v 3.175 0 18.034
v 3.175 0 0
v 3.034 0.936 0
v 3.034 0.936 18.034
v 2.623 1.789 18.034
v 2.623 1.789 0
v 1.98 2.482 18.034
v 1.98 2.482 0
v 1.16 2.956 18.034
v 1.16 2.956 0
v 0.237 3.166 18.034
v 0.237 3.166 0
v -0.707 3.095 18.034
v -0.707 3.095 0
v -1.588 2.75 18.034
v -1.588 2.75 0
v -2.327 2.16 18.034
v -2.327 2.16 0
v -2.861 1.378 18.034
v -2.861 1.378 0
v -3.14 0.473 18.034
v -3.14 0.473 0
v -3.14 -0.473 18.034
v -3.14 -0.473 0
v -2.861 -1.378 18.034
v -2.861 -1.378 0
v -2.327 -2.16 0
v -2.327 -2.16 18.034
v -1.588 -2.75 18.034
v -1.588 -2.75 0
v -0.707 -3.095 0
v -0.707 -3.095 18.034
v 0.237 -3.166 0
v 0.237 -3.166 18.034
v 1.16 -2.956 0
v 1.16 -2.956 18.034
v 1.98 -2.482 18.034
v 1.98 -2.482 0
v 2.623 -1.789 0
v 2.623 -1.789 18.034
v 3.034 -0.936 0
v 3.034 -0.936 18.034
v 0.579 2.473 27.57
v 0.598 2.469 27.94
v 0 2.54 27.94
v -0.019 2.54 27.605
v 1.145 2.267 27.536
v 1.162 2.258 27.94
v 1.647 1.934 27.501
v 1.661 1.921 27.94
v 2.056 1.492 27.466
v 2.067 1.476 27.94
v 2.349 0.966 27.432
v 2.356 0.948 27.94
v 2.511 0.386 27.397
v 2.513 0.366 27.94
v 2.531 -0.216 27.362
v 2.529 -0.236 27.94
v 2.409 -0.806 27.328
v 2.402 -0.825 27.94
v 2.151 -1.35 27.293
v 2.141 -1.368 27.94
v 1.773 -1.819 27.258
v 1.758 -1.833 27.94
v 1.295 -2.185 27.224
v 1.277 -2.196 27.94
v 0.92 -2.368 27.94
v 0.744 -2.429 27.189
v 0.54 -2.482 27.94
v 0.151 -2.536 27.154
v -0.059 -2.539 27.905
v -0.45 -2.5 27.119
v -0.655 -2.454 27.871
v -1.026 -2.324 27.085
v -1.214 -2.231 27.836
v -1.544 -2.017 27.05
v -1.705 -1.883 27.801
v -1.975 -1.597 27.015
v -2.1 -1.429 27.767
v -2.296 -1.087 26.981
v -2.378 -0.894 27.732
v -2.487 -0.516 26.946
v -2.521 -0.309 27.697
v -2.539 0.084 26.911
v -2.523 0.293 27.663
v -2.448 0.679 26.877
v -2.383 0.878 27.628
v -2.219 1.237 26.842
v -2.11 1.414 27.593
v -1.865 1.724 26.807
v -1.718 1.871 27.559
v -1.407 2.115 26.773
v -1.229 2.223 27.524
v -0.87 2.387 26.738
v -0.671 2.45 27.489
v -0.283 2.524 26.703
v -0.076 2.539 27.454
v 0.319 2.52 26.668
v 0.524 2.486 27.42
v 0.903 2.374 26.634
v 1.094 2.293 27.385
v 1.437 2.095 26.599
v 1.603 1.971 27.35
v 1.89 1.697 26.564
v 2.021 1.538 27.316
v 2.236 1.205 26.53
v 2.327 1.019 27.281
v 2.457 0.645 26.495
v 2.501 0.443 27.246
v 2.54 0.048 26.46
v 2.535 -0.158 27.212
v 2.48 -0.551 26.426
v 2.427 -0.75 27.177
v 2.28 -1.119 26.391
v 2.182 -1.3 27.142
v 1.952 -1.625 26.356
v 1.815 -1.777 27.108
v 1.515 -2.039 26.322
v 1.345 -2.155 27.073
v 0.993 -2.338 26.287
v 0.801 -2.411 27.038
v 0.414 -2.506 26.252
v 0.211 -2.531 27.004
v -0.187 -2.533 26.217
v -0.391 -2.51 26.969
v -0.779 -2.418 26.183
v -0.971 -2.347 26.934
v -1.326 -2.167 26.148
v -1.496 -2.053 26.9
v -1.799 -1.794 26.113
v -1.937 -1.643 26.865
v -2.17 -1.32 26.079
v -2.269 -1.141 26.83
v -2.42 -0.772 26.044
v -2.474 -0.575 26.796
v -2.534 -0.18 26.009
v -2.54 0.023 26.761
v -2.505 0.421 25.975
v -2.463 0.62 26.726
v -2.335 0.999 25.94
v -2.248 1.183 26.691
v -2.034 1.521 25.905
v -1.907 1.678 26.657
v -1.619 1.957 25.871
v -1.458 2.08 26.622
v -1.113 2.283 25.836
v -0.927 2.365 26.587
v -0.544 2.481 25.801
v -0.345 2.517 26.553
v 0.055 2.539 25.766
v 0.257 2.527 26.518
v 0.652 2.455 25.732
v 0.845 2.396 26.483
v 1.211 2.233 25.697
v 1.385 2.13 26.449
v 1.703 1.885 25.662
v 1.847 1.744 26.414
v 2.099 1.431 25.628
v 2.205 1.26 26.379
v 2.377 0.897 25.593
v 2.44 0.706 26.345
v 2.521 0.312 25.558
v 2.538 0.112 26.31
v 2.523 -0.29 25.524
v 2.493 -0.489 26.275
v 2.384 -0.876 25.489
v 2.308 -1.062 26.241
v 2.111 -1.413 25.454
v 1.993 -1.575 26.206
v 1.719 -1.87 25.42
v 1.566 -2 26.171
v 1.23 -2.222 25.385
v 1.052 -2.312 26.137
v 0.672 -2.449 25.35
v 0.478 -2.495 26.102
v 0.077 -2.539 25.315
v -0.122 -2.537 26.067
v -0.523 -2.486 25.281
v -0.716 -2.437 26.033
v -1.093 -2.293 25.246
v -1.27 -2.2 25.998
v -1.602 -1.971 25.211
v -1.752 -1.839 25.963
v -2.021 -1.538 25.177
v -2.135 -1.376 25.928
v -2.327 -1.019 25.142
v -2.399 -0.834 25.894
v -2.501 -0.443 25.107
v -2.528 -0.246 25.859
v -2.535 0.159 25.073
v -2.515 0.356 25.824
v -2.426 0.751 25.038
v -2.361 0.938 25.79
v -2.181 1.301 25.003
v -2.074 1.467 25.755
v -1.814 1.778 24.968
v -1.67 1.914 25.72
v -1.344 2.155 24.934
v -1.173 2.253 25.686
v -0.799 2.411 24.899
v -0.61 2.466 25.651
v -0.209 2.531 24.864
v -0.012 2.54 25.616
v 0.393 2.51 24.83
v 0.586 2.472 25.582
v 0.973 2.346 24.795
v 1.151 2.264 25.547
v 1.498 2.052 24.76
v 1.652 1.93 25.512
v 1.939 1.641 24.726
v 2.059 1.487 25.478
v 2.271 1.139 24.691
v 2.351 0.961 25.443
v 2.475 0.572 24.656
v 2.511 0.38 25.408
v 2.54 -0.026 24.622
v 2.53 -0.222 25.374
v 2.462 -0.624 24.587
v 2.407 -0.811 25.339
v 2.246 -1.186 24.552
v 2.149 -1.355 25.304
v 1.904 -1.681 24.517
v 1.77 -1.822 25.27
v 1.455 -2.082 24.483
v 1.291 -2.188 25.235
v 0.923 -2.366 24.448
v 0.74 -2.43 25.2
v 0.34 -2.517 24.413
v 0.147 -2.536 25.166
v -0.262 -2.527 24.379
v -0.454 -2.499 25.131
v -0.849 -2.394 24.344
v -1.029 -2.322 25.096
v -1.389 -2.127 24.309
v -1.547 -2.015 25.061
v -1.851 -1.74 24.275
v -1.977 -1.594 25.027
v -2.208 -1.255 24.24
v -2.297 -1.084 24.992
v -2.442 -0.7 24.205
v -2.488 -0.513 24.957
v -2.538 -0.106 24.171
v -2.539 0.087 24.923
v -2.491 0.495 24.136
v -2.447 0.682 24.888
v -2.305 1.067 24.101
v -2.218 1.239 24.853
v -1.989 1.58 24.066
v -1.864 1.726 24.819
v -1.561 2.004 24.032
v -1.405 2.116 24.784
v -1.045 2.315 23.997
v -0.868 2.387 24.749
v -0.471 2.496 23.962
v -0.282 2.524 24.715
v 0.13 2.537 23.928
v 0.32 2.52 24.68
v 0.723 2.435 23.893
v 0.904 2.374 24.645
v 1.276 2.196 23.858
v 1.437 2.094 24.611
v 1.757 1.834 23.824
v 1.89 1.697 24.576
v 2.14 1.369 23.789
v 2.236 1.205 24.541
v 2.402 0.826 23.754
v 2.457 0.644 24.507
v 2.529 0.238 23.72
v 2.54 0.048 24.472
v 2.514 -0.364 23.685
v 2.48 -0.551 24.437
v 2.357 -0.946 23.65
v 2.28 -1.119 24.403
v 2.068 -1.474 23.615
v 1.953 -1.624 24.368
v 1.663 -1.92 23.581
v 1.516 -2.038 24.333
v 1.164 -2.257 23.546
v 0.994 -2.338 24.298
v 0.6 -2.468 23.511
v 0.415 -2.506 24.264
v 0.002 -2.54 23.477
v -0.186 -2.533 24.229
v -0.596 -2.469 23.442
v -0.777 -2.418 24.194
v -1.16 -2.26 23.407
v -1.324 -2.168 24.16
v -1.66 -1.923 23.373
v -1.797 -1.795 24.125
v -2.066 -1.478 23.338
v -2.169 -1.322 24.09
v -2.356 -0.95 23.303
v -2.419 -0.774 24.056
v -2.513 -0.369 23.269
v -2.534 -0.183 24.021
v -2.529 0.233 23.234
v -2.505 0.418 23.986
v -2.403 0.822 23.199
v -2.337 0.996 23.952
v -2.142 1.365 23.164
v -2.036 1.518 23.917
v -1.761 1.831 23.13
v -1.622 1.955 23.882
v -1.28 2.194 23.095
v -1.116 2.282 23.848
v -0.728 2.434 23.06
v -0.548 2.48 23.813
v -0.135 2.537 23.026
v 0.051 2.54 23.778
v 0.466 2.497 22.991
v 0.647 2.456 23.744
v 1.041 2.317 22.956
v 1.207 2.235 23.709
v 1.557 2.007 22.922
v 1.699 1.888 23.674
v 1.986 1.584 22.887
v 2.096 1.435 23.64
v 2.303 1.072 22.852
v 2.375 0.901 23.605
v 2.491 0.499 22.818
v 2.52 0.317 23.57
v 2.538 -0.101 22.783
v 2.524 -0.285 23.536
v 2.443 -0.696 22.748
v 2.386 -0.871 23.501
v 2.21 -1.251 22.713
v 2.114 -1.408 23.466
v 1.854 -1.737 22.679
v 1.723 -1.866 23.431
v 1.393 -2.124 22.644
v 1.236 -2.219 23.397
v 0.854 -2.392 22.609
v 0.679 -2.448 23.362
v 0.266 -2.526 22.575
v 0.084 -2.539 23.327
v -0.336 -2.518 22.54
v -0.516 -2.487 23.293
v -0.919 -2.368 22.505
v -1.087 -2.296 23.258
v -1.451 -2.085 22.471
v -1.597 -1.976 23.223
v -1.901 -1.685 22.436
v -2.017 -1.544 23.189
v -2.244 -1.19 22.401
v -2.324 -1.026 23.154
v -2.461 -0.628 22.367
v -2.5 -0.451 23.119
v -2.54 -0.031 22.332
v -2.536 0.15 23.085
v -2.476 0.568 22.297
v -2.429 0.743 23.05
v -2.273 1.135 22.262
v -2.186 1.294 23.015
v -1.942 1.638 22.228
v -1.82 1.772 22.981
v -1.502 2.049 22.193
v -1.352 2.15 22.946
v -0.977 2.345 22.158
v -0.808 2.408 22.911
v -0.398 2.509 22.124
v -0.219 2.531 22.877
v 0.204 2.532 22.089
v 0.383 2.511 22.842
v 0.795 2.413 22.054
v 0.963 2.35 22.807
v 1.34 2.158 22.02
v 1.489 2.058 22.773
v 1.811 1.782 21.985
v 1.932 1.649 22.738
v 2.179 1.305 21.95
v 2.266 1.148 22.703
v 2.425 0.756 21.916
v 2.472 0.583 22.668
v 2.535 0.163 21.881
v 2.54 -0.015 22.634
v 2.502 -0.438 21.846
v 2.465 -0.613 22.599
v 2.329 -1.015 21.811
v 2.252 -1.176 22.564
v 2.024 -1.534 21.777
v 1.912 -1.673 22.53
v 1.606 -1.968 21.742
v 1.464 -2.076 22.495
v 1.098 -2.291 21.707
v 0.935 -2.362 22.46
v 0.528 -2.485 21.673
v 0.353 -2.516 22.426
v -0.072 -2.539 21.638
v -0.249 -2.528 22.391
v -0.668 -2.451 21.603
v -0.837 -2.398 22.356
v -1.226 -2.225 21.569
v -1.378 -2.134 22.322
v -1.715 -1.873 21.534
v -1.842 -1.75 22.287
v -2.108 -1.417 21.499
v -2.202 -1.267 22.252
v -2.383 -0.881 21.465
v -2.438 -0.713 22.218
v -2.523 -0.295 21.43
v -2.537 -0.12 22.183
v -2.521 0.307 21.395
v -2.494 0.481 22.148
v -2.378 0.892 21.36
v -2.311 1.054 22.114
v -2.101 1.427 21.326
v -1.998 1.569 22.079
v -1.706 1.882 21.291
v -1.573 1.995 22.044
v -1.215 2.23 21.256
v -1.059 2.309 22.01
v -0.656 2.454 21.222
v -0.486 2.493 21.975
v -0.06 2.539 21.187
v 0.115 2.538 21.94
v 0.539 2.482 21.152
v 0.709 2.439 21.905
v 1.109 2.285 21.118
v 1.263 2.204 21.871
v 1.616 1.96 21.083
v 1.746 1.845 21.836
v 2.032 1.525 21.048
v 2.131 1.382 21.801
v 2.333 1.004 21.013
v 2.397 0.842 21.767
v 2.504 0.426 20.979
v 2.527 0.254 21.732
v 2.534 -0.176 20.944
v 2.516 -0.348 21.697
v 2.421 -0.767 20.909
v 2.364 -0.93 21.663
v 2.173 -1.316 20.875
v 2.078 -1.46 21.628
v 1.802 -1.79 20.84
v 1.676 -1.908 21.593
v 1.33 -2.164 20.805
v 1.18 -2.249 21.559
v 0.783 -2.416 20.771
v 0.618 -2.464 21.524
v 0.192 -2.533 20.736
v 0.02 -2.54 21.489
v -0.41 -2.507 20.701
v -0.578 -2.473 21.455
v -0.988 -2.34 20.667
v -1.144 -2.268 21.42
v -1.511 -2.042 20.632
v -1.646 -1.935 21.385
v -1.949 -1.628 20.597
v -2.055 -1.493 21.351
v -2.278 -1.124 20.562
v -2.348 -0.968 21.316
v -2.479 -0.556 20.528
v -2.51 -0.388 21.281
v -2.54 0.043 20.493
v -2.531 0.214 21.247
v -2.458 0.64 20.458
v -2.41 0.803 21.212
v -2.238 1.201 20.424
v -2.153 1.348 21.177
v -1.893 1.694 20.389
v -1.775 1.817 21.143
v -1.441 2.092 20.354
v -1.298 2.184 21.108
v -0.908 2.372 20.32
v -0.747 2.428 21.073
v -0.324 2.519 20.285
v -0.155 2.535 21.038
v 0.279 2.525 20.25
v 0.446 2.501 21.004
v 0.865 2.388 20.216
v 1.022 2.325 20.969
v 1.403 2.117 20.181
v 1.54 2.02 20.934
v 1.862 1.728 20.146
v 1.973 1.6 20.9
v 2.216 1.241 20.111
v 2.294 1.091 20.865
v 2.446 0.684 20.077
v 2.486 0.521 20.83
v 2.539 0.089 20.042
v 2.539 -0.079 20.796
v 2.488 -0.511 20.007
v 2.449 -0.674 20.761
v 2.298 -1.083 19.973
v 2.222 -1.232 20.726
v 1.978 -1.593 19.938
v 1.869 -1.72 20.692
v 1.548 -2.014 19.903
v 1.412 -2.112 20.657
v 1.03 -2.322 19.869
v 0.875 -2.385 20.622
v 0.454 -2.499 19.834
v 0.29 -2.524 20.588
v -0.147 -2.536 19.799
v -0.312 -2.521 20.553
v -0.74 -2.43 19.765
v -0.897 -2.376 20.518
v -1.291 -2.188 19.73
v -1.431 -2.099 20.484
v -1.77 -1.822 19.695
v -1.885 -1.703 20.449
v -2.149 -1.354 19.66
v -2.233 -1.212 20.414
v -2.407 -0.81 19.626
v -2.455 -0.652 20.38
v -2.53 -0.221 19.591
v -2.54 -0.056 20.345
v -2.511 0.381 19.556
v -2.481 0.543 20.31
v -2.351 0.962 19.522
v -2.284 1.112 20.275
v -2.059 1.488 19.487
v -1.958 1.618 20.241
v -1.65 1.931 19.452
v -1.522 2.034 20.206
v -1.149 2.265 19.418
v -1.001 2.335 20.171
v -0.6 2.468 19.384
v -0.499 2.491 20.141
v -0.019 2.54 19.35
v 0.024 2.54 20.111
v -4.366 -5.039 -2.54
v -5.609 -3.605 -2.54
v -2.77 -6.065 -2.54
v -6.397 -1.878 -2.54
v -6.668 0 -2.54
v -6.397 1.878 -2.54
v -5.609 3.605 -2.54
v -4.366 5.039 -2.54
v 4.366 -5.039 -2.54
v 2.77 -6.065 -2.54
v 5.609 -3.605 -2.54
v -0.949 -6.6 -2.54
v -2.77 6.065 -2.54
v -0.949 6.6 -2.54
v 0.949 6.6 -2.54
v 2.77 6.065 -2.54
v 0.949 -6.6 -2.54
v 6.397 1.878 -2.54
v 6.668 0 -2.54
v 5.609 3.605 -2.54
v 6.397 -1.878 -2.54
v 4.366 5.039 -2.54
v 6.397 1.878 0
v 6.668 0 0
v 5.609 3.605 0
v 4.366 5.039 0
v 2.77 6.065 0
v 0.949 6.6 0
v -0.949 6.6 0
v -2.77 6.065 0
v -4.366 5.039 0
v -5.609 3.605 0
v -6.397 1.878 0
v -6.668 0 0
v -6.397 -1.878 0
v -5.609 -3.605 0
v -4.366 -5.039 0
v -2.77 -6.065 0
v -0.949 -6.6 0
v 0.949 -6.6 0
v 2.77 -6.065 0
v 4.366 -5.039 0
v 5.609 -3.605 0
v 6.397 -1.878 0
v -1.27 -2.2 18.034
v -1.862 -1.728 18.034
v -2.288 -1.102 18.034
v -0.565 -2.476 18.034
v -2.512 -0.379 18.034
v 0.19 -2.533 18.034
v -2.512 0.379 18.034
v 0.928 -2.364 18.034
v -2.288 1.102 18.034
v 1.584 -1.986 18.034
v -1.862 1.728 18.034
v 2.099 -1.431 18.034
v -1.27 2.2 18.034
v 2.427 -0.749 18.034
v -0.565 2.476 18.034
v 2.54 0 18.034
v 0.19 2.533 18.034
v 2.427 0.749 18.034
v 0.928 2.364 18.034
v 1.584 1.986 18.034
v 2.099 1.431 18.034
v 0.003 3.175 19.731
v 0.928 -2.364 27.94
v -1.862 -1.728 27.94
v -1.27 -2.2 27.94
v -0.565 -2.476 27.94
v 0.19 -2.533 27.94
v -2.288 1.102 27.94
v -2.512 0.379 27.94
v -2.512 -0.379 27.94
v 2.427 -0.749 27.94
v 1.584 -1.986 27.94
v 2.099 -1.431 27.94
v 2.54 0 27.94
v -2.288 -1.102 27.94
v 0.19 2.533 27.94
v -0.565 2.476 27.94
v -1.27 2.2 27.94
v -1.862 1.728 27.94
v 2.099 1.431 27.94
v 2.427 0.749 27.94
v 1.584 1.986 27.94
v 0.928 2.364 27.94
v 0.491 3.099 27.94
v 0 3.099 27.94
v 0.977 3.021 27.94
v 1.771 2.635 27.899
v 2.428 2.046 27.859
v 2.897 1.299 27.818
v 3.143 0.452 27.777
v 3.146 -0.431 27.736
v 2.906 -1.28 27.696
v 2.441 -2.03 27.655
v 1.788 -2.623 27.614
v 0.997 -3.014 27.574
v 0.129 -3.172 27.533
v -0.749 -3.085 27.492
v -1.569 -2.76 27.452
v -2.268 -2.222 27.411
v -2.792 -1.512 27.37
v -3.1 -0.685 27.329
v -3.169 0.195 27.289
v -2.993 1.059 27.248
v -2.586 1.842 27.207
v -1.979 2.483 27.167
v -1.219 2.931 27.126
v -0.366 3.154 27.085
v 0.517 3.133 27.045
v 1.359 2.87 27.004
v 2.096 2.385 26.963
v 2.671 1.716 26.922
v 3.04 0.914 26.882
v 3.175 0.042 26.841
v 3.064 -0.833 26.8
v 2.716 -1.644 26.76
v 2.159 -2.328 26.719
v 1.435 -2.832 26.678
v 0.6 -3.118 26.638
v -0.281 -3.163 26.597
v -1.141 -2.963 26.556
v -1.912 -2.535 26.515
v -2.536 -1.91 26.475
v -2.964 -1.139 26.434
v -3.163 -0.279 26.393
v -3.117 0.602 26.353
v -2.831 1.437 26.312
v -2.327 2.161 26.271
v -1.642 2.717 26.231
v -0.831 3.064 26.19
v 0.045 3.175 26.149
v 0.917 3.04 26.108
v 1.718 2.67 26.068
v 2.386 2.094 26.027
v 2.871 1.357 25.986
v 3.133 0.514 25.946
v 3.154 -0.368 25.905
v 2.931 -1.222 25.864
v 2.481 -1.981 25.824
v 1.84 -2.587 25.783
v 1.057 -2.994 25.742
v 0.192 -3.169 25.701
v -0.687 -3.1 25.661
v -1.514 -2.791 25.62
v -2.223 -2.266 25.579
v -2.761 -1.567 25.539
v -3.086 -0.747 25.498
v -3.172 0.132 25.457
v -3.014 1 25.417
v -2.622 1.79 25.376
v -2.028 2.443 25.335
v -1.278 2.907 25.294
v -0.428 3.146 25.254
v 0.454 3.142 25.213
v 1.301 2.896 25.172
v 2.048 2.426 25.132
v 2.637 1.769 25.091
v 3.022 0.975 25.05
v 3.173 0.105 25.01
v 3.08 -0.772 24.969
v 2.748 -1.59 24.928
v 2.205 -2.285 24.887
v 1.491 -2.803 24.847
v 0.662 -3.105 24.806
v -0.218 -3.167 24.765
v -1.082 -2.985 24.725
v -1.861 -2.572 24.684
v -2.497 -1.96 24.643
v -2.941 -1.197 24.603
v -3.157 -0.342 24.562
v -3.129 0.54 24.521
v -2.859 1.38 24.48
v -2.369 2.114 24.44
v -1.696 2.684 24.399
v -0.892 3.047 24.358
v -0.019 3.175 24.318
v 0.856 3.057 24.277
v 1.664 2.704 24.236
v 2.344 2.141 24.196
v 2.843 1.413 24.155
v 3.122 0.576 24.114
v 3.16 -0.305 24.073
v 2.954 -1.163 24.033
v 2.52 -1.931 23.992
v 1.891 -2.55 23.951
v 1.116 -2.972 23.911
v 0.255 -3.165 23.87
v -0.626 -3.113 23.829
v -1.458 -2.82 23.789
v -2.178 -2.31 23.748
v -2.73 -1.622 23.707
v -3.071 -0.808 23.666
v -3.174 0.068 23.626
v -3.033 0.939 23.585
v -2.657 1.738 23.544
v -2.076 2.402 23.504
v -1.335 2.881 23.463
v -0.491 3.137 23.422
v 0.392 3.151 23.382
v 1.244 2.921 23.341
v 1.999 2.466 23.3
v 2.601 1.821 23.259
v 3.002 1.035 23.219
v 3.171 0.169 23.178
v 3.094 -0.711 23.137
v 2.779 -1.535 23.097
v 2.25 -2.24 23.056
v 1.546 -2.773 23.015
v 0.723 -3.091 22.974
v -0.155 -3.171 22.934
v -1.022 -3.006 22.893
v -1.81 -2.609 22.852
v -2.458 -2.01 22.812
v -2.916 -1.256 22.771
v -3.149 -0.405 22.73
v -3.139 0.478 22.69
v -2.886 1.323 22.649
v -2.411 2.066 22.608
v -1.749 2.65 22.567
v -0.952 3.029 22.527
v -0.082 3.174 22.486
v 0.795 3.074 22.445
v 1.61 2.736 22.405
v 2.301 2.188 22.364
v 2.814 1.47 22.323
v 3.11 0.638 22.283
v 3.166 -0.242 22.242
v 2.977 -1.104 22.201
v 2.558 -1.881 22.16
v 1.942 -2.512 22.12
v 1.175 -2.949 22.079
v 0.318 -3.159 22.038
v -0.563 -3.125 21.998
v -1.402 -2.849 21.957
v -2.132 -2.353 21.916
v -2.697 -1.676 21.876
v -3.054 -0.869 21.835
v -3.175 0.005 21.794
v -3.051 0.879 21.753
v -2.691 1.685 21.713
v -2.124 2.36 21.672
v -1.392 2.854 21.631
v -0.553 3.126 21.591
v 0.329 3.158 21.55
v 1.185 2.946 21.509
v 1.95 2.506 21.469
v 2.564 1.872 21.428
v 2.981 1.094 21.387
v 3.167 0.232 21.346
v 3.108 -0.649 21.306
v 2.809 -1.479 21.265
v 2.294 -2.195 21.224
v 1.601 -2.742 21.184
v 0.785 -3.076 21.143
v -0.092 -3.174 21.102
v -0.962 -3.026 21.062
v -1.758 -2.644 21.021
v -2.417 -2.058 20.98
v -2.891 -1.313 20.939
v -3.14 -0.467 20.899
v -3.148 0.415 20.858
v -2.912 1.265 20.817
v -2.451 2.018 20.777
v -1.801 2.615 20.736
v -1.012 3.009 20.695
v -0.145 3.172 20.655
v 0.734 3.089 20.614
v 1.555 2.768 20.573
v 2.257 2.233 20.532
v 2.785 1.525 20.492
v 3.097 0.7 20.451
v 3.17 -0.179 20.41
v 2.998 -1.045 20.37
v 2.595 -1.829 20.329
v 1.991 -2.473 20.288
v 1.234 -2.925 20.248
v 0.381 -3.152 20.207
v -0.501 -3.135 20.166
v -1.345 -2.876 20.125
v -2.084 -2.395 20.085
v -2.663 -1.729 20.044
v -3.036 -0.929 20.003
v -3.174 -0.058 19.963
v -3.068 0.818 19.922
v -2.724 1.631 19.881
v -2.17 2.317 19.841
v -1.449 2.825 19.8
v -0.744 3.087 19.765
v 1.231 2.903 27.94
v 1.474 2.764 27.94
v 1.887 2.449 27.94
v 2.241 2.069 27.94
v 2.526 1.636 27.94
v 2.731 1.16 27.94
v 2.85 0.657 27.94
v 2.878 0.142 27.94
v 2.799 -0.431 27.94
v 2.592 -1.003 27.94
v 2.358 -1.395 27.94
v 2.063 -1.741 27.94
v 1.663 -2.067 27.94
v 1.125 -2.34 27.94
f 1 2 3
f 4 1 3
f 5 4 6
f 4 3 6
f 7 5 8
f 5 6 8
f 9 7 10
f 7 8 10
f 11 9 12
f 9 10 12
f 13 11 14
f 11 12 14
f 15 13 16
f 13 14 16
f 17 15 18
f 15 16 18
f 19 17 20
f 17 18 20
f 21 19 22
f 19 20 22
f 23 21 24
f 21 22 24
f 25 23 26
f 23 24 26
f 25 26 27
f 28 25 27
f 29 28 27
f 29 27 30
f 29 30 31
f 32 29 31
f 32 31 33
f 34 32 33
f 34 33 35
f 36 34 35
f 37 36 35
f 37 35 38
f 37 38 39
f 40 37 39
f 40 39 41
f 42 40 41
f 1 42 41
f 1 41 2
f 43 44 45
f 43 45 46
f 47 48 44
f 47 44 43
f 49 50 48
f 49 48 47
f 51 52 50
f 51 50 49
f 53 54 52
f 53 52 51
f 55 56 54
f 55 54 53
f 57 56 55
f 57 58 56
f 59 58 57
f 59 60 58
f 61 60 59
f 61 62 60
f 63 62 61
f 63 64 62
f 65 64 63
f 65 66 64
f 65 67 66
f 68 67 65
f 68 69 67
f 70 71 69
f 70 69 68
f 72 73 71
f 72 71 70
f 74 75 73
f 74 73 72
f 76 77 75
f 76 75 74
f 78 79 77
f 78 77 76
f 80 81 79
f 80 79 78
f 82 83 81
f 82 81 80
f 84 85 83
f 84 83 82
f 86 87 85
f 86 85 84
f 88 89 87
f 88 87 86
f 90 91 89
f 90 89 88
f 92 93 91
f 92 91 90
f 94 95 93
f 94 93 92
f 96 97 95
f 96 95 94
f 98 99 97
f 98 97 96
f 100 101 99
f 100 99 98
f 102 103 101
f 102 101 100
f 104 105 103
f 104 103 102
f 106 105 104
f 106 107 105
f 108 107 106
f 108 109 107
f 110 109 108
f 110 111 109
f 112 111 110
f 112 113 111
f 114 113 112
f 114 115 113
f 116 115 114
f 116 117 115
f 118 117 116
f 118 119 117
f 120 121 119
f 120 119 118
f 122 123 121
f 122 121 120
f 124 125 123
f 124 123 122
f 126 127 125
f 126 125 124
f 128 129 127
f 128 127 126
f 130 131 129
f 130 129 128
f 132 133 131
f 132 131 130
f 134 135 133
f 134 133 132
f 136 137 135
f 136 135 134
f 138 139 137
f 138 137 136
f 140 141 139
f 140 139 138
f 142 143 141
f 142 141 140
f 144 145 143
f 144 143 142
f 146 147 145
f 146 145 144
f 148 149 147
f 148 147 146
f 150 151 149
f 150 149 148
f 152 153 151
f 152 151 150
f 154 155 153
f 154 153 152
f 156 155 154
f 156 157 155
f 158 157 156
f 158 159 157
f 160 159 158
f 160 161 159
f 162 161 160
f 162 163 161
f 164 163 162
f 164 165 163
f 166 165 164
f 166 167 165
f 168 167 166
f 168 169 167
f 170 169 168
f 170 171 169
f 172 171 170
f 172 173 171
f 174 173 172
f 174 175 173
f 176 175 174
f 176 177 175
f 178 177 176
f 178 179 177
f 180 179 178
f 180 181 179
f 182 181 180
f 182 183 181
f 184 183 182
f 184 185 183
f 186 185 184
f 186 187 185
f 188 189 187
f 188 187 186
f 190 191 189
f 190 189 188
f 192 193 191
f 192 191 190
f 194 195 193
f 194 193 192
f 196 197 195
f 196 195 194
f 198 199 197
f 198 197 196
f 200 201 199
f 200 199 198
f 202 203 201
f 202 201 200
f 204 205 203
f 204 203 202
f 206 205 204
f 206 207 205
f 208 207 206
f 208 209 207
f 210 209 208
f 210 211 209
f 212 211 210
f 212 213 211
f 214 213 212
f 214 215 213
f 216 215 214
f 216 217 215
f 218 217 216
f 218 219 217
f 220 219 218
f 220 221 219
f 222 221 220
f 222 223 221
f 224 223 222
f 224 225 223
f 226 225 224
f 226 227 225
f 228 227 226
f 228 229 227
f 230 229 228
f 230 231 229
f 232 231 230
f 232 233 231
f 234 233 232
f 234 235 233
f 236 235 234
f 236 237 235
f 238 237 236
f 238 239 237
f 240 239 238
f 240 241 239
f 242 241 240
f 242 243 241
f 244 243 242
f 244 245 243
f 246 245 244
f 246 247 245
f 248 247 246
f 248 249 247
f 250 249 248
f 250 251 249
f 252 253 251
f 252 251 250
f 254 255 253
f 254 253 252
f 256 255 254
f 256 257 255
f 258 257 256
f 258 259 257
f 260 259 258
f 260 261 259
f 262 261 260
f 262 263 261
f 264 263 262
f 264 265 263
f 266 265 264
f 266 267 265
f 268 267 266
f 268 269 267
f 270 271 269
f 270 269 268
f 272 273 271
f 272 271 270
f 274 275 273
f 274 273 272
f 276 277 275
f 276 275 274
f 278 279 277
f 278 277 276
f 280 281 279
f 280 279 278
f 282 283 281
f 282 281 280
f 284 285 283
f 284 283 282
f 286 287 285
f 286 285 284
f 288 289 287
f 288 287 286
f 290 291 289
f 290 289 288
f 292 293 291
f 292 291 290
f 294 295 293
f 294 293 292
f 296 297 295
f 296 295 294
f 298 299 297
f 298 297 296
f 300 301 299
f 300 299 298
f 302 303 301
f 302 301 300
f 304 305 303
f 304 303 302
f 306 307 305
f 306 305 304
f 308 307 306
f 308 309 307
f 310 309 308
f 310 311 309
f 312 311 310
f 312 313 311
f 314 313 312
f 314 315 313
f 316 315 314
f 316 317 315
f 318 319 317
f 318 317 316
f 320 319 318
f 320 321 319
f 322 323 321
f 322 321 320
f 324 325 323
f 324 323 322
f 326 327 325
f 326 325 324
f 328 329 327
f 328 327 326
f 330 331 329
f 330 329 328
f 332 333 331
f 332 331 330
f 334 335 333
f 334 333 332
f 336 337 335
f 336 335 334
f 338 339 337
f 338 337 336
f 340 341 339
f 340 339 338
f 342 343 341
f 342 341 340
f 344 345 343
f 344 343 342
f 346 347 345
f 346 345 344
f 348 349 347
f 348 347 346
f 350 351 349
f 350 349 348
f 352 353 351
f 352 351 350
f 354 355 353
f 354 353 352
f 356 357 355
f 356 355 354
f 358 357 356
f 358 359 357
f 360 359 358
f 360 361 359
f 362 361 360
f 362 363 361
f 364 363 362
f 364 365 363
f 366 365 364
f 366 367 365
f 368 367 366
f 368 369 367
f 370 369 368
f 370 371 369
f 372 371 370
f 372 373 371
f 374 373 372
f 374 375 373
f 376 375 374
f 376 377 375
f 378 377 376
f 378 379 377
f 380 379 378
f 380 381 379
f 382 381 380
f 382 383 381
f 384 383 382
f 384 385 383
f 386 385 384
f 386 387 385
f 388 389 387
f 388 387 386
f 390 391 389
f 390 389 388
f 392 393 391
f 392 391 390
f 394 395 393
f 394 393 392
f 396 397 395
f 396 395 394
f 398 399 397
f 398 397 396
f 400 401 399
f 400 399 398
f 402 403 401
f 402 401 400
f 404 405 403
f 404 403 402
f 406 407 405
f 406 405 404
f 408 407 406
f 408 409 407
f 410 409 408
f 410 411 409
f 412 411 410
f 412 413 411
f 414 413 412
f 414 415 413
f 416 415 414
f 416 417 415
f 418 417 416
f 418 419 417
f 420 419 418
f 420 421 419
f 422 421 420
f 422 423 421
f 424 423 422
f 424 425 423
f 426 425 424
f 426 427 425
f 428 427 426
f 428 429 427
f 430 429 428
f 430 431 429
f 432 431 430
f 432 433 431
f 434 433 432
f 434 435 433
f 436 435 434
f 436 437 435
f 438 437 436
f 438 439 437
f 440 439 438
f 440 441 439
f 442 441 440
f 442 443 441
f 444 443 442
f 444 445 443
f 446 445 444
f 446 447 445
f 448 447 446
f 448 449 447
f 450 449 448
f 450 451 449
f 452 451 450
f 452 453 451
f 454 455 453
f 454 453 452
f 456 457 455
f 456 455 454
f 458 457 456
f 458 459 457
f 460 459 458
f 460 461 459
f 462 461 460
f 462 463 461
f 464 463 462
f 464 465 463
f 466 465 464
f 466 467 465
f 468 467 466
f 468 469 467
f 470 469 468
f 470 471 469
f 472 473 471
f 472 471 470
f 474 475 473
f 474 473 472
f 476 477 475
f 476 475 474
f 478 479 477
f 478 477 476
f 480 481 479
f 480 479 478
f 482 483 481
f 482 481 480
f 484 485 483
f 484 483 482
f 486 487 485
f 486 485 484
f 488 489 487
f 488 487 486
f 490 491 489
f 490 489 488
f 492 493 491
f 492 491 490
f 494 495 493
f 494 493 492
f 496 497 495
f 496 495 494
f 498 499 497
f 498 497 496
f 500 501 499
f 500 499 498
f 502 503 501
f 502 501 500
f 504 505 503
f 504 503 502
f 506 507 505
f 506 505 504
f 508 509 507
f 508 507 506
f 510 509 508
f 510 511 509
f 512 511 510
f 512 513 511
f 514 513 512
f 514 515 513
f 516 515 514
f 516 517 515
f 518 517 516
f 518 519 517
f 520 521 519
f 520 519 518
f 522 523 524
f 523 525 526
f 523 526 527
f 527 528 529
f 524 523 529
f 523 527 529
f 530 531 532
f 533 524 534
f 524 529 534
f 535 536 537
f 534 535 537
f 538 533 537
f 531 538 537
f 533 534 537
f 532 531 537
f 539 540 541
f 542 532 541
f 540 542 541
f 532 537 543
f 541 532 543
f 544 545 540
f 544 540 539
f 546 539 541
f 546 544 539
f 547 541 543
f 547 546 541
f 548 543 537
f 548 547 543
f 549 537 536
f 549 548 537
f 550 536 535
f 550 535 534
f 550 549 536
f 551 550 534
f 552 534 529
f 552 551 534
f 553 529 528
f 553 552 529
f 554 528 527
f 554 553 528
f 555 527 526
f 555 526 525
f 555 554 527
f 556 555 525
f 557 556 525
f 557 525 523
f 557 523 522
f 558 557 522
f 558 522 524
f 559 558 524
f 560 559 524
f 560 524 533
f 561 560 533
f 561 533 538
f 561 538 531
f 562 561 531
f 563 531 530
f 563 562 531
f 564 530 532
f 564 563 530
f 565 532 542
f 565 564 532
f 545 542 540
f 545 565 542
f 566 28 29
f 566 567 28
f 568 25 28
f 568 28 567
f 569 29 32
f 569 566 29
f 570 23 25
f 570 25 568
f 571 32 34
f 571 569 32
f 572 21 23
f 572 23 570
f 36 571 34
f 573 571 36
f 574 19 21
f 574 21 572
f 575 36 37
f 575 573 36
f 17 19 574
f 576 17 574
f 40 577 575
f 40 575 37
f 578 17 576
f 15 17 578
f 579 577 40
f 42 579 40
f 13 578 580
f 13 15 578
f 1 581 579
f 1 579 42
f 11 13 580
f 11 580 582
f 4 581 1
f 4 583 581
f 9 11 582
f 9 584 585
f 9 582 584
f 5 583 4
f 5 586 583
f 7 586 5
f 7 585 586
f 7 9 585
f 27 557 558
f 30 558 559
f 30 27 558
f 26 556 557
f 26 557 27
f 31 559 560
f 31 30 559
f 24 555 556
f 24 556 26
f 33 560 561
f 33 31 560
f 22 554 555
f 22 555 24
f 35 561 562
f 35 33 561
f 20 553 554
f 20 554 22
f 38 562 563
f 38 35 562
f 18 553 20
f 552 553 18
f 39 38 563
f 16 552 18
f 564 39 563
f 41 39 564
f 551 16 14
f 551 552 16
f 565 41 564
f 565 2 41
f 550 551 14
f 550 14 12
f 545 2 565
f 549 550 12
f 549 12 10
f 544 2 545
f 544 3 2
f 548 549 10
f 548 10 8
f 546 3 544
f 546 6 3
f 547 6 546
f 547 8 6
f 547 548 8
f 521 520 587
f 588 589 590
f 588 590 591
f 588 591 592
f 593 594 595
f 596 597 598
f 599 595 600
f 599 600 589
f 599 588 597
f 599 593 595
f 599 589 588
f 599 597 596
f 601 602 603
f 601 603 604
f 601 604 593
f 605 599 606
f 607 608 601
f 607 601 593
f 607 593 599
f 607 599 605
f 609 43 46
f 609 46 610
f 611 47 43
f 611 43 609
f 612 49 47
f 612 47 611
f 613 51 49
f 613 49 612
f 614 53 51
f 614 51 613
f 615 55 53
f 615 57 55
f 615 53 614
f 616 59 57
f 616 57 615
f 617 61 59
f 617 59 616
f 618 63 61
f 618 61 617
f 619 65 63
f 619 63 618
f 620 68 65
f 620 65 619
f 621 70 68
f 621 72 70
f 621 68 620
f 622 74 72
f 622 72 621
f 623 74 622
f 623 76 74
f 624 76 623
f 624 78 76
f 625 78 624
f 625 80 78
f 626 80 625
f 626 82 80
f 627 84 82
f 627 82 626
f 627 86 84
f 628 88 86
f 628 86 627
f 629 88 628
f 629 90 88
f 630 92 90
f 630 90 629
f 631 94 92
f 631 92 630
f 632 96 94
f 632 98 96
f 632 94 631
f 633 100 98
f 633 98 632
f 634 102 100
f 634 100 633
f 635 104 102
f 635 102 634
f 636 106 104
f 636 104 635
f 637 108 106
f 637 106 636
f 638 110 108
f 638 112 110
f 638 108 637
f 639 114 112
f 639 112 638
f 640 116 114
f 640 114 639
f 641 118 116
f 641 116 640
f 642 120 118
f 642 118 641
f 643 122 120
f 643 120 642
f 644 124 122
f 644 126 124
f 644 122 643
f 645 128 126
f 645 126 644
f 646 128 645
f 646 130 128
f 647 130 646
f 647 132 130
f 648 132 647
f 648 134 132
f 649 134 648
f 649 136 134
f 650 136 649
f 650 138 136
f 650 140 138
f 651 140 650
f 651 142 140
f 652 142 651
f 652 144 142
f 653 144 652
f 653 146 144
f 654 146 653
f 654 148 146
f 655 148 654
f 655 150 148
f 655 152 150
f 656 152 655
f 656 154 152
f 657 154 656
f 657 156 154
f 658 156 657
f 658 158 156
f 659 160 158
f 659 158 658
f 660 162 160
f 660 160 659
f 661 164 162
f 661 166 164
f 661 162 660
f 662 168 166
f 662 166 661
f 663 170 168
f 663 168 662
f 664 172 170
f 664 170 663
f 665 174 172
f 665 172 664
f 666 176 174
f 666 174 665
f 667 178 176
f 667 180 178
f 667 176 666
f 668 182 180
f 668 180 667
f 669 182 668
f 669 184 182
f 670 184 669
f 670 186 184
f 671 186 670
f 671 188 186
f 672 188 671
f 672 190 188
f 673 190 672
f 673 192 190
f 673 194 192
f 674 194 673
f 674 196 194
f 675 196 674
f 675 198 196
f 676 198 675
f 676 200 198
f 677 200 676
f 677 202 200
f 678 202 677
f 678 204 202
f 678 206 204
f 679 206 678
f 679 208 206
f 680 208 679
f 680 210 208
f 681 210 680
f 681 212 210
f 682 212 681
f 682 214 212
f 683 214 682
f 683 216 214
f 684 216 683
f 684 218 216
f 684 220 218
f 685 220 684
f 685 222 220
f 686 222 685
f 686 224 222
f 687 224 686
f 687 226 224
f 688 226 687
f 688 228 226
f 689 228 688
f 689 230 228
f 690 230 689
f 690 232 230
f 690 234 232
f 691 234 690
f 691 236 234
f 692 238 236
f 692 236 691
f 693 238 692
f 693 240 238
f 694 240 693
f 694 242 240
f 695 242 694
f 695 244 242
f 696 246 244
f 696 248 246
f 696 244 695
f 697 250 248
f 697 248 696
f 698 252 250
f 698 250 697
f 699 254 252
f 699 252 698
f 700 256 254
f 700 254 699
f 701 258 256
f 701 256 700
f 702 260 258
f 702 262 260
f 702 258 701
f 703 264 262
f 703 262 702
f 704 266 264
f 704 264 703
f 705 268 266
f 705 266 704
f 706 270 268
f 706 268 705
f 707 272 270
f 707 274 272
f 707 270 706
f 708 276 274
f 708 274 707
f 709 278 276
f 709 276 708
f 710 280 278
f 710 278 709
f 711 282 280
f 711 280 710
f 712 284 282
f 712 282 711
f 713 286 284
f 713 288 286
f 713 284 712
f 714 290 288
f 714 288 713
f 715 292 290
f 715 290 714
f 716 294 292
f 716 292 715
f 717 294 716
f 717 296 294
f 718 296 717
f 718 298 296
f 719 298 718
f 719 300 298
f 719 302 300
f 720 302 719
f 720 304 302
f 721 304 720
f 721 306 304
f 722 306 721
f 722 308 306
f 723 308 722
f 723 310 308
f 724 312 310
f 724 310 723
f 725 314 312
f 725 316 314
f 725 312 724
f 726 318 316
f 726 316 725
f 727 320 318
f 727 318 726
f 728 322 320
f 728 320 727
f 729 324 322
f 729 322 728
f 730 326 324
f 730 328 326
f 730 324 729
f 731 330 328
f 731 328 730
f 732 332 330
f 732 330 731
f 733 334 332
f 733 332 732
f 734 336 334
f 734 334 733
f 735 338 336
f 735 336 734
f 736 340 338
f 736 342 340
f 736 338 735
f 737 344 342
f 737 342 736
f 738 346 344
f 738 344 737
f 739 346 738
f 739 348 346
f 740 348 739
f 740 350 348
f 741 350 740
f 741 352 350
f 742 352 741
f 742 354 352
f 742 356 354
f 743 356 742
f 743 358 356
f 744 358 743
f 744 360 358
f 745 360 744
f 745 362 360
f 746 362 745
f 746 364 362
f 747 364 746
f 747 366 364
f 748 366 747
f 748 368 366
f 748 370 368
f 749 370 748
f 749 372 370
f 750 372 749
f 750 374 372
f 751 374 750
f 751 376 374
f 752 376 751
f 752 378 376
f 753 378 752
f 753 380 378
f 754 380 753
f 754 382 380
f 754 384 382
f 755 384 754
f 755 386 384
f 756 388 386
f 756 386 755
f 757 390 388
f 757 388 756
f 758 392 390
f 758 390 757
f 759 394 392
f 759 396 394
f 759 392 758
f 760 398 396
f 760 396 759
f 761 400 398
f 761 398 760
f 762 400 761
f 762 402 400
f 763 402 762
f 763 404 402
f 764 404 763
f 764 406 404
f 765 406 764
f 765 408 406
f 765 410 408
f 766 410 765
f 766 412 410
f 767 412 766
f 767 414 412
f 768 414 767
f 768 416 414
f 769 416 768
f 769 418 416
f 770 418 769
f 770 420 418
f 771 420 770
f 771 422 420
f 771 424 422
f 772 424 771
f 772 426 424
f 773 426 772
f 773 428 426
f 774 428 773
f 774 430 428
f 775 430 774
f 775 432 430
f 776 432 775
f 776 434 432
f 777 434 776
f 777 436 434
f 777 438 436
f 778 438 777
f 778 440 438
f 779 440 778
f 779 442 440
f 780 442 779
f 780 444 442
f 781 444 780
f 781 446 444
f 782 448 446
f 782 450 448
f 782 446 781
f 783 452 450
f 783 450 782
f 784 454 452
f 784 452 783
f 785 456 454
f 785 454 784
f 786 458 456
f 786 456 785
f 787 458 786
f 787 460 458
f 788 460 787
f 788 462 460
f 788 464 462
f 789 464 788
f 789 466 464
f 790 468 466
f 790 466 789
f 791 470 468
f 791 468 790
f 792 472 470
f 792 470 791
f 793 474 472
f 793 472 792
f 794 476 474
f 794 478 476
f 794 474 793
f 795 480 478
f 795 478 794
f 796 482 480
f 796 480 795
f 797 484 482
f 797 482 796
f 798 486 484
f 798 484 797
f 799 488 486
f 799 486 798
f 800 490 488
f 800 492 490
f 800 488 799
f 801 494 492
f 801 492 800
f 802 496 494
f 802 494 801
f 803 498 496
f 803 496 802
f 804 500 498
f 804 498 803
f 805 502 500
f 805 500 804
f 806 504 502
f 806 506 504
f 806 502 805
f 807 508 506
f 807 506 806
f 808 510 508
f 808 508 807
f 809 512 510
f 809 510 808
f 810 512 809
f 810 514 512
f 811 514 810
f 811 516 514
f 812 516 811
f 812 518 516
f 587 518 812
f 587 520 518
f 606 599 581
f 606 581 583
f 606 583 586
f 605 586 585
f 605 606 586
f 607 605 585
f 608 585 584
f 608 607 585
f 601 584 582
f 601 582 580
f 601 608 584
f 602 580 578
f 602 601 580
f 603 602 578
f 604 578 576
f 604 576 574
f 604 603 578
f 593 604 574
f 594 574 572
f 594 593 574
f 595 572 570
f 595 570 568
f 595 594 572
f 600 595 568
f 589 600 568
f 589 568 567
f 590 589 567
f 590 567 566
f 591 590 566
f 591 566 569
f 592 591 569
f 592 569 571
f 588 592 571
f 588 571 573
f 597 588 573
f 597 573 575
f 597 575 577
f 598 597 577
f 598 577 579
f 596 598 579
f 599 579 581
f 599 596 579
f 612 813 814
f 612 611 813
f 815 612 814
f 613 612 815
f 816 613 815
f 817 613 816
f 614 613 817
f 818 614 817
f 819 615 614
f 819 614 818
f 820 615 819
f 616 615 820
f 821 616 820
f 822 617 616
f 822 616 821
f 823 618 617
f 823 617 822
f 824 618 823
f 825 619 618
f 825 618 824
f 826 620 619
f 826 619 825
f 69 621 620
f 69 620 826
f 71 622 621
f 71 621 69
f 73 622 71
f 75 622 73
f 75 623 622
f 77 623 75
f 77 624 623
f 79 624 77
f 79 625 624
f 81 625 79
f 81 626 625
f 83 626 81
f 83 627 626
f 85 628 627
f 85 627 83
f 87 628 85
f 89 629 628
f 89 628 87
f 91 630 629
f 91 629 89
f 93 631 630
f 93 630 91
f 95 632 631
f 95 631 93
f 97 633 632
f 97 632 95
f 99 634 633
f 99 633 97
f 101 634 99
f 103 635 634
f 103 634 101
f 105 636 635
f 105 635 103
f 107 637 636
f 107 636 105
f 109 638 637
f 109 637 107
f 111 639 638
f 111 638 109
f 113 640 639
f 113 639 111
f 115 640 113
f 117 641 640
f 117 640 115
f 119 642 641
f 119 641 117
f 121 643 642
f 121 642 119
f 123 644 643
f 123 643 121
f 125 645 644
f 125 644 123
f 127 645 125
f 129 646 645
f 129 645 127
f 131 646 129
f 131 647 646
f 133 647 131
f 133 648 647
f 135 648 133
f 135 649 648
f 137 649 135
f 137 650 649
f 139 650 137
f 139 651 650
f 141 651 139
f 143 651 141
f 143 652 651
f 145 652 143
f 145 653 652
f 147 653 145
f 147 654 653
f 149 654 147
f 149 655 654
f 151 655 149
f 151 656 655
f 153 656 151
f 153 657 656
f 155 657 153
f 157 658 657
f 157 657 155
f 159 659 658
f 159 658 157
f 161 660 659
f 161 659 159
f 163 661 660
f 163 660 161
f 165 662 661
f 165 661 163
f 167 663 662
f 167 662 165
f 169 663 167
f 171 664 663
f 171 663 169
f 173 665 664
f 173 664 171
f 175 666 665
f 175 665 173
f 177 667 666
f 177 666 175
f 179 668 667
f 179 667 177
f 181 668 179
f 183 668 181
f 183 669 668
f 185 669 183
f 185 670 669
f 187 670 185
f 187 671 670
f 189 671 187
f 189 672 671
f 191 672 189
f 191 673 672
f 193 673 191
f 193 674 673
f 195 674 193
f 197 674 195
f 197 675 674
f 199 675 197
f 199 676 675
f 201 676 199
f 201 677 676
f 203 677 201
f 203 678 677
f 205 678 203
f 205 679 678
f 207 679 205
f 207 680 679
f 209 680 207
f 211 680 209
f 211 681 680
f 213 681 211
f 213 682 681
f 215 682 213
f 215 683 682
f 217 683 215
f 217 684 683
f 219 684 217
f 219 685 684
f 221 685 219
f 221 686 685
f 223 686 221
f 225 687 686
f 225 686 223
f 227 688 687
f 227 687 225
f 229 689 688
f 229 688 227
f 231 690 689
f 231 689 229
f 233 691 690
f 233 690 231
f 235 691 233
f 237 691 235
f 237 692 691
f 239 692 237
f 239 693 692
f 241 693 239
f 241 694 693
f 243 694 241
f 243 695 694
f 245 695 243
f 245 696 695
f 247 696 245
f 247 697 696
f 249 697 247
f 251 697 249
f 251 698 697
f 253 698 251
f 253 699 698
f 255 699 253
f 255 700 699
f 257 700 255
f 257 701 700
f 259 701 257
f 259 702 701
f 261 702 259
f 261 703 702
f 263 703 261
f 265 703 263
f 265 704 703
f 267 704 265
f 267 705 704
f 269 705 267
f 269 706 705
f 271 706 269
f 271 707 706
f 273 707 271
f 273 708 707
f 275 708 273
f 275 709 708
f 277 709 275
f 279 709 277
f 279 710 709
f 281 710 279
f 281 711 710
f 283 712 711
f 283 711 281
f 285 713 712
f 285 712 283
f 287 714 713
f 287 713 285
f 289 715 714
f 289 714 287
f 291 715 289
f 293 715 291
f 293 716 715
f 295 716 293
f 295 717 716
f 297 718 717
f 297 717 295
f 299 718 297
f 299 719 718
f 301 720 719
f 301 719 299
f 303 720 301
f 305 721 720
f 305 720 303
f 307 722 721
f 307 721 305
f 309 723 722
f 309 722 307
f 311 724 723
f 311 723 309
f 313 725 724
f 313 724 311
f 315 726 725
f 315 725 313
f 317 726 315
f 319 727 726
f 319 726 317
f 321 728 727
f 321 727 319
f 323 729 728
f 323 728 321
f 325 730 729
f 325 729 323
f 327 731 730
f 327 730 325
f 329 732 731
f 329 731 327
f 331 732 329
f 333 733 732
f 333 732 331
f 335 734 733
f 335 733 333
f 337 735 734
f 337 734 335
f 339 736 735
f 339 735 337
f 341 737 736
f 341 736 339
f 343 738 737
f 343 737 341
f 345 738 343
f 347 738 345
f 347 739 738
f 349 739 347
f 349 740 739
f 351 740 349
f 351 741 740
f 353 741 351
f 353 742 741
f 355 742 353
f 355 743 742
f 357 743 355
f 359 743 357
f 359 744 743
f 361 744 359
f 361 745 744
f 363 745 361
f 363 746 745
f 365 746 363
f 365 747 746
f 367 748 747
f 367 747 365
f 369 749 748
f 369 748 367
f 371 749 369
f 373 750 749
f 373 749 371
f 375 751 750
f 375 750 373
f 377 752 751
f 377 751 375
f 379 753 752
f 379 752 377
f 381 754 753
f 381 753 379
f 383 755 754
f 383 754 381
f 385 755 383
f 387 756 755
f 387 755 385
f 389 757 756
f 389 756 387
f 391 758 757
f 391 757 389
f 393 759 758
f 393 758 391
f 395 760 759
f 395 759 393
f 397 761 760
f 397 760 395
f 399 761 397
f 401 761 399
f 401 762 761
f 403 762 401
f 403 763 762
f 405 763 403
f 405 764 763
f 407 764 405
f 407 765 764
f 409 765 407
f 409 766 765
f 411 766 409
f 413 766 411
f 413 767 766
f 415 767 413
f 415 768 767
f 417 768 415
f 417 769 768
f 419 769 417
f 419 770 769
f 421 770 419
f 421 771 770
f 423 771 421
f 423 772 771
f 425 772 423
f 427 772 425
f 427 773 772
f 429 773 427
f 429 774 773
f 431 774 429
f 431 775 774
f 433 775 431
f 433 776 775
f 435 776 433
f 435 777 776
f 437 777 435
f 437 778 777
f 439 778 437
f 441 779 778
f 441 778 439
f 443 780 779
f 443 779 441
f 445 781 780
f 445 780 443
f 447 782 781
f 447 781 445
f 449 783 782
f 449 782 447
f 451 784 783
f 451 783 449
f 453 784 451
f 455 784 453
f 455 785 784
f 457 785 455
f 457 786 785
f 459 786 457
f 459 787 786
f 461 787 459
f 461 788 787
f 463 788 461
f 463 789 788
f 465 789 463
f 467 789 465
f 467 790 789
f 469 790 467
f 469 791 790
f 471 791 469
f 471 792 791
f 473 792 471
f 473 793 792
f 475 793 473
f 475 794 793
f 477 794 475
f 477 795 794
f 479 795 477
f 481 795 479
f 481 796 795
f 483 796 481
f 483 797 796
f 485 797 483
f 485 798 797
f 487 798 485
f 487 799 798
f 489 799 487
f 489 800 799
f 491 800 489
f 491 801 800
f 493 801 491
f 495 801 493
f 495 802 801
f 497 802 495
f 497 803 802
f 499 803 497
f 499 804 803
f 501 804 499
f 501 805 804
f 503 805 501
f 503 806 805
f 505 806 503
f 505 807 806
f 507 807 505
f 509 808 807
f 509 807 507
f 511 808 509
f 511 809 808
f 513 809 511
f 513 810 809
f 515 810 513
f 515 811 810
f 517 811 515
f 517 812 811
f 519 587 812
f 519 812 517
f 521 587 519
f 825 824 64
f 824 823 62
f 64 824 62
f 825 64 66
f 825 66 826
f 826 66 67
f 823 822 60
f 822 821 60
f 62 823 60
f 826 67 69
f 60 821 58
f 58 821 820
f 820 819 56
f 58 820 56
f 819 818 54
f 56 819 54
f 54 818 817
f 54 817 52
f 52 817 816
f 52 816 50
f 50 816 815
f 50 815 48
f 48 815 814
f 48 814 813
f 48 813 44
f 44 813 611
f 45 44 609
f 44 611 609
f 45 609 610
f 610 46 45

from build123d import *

# Parameters (mm, degrees)
SKETCH1_R           = 3.175
BOSS_EXTRUDE1_DEPTH = 27.94
SKETCH2_R           = 6.6675
BOSS_EXTRUDE2_DEPTH = 2.54
SKETCH3_R           = 3.175
SKETCH3_R_2         = 2.54
CUT_EXTRUDE1_DEPTH  = 9.906
SWEEP1_PITCH        = 0.917222222
SWEEP1_HEIGHT       = 8.255
SWEEP1_RADIUS       = 2.54
SWEEP1_START_ANGLE  = 90
SKETCH6_W           = 2.025979595
SKETCH6_H           = 0.581412662


with BuildPart() as part:
    # Sketch1 → Boss-Extrude1 (new body)
    with BuildSketch(Plane.XY):
        Circle(SKETCH1_R)
    extrude(amount=BOSS_EXTRUDE1_DEPTH)

    # Sketch2 → Boss-Extrude2 (add)
    with BuildSketch(Plane.XY):
        Circle(SKETCH2_R)
    extrude(amount=-BOSS_EXTRUDE2_DEPTH)

    # Sketch3 → Cut-Extrude1 (cut)
    with BuildSketch(Plane.XY.offset(27.94)):
        Circle(SKETCH3_R)
        Circle(SKETCH3_R_2, mode=Mode.SUBTRACT)
    extrude(amount=-CUT_EXTRUDE1_DEPTH, mode=Mode.SUBTRACT)


with BuildPart() as body_2:
    # Sweep1: sweep along a helix
    with BuildLine() as sweep1_path:
        add(Helix(SWEEP1_PITCH, SWEEP1_HEIGHT, SWEEP1_RADIUS, center=(0, 0, 27.94), direction=(0, 0, -1), mode=Mode.PRIVATE).rotate(Axis((0, 0, 27.94), (0, 0, -1)), SWEEP1_START_ANGLE))
    # Sketch5 → Sweep1 (sweep)
    with BuildSketch(Plane(origin=(0, 2.54, 19.685), x_dir=(-0.057377934, 0, -0.998352529), z_dir=(0.998352529, 0, -0.057377934))):
        Polygon((-0.42661441, 0), (0.33538559, 0), (-0.04561441, 0.635), align=None)
    sweep(path=sweep1_path.line, is_frenet=True)

    # Sketch6 → Cut-Revolve1 (revolve, cut)
    with BuildSketch(Plane(origin=(0, 0, 0), x_dir=(1, 0, 0), z_dir=(0, 1, 0))):
        with Locations((2.279143785, -28.230706331)):
            Rectangle(SKETCH6_W, SKETCH6_H)
    revolve(axis=Axis((0, 0, 0), (0, 0, 1)), mode=Mode.SUBTRACT)


solid = Compound([part.part, body_2.part])
